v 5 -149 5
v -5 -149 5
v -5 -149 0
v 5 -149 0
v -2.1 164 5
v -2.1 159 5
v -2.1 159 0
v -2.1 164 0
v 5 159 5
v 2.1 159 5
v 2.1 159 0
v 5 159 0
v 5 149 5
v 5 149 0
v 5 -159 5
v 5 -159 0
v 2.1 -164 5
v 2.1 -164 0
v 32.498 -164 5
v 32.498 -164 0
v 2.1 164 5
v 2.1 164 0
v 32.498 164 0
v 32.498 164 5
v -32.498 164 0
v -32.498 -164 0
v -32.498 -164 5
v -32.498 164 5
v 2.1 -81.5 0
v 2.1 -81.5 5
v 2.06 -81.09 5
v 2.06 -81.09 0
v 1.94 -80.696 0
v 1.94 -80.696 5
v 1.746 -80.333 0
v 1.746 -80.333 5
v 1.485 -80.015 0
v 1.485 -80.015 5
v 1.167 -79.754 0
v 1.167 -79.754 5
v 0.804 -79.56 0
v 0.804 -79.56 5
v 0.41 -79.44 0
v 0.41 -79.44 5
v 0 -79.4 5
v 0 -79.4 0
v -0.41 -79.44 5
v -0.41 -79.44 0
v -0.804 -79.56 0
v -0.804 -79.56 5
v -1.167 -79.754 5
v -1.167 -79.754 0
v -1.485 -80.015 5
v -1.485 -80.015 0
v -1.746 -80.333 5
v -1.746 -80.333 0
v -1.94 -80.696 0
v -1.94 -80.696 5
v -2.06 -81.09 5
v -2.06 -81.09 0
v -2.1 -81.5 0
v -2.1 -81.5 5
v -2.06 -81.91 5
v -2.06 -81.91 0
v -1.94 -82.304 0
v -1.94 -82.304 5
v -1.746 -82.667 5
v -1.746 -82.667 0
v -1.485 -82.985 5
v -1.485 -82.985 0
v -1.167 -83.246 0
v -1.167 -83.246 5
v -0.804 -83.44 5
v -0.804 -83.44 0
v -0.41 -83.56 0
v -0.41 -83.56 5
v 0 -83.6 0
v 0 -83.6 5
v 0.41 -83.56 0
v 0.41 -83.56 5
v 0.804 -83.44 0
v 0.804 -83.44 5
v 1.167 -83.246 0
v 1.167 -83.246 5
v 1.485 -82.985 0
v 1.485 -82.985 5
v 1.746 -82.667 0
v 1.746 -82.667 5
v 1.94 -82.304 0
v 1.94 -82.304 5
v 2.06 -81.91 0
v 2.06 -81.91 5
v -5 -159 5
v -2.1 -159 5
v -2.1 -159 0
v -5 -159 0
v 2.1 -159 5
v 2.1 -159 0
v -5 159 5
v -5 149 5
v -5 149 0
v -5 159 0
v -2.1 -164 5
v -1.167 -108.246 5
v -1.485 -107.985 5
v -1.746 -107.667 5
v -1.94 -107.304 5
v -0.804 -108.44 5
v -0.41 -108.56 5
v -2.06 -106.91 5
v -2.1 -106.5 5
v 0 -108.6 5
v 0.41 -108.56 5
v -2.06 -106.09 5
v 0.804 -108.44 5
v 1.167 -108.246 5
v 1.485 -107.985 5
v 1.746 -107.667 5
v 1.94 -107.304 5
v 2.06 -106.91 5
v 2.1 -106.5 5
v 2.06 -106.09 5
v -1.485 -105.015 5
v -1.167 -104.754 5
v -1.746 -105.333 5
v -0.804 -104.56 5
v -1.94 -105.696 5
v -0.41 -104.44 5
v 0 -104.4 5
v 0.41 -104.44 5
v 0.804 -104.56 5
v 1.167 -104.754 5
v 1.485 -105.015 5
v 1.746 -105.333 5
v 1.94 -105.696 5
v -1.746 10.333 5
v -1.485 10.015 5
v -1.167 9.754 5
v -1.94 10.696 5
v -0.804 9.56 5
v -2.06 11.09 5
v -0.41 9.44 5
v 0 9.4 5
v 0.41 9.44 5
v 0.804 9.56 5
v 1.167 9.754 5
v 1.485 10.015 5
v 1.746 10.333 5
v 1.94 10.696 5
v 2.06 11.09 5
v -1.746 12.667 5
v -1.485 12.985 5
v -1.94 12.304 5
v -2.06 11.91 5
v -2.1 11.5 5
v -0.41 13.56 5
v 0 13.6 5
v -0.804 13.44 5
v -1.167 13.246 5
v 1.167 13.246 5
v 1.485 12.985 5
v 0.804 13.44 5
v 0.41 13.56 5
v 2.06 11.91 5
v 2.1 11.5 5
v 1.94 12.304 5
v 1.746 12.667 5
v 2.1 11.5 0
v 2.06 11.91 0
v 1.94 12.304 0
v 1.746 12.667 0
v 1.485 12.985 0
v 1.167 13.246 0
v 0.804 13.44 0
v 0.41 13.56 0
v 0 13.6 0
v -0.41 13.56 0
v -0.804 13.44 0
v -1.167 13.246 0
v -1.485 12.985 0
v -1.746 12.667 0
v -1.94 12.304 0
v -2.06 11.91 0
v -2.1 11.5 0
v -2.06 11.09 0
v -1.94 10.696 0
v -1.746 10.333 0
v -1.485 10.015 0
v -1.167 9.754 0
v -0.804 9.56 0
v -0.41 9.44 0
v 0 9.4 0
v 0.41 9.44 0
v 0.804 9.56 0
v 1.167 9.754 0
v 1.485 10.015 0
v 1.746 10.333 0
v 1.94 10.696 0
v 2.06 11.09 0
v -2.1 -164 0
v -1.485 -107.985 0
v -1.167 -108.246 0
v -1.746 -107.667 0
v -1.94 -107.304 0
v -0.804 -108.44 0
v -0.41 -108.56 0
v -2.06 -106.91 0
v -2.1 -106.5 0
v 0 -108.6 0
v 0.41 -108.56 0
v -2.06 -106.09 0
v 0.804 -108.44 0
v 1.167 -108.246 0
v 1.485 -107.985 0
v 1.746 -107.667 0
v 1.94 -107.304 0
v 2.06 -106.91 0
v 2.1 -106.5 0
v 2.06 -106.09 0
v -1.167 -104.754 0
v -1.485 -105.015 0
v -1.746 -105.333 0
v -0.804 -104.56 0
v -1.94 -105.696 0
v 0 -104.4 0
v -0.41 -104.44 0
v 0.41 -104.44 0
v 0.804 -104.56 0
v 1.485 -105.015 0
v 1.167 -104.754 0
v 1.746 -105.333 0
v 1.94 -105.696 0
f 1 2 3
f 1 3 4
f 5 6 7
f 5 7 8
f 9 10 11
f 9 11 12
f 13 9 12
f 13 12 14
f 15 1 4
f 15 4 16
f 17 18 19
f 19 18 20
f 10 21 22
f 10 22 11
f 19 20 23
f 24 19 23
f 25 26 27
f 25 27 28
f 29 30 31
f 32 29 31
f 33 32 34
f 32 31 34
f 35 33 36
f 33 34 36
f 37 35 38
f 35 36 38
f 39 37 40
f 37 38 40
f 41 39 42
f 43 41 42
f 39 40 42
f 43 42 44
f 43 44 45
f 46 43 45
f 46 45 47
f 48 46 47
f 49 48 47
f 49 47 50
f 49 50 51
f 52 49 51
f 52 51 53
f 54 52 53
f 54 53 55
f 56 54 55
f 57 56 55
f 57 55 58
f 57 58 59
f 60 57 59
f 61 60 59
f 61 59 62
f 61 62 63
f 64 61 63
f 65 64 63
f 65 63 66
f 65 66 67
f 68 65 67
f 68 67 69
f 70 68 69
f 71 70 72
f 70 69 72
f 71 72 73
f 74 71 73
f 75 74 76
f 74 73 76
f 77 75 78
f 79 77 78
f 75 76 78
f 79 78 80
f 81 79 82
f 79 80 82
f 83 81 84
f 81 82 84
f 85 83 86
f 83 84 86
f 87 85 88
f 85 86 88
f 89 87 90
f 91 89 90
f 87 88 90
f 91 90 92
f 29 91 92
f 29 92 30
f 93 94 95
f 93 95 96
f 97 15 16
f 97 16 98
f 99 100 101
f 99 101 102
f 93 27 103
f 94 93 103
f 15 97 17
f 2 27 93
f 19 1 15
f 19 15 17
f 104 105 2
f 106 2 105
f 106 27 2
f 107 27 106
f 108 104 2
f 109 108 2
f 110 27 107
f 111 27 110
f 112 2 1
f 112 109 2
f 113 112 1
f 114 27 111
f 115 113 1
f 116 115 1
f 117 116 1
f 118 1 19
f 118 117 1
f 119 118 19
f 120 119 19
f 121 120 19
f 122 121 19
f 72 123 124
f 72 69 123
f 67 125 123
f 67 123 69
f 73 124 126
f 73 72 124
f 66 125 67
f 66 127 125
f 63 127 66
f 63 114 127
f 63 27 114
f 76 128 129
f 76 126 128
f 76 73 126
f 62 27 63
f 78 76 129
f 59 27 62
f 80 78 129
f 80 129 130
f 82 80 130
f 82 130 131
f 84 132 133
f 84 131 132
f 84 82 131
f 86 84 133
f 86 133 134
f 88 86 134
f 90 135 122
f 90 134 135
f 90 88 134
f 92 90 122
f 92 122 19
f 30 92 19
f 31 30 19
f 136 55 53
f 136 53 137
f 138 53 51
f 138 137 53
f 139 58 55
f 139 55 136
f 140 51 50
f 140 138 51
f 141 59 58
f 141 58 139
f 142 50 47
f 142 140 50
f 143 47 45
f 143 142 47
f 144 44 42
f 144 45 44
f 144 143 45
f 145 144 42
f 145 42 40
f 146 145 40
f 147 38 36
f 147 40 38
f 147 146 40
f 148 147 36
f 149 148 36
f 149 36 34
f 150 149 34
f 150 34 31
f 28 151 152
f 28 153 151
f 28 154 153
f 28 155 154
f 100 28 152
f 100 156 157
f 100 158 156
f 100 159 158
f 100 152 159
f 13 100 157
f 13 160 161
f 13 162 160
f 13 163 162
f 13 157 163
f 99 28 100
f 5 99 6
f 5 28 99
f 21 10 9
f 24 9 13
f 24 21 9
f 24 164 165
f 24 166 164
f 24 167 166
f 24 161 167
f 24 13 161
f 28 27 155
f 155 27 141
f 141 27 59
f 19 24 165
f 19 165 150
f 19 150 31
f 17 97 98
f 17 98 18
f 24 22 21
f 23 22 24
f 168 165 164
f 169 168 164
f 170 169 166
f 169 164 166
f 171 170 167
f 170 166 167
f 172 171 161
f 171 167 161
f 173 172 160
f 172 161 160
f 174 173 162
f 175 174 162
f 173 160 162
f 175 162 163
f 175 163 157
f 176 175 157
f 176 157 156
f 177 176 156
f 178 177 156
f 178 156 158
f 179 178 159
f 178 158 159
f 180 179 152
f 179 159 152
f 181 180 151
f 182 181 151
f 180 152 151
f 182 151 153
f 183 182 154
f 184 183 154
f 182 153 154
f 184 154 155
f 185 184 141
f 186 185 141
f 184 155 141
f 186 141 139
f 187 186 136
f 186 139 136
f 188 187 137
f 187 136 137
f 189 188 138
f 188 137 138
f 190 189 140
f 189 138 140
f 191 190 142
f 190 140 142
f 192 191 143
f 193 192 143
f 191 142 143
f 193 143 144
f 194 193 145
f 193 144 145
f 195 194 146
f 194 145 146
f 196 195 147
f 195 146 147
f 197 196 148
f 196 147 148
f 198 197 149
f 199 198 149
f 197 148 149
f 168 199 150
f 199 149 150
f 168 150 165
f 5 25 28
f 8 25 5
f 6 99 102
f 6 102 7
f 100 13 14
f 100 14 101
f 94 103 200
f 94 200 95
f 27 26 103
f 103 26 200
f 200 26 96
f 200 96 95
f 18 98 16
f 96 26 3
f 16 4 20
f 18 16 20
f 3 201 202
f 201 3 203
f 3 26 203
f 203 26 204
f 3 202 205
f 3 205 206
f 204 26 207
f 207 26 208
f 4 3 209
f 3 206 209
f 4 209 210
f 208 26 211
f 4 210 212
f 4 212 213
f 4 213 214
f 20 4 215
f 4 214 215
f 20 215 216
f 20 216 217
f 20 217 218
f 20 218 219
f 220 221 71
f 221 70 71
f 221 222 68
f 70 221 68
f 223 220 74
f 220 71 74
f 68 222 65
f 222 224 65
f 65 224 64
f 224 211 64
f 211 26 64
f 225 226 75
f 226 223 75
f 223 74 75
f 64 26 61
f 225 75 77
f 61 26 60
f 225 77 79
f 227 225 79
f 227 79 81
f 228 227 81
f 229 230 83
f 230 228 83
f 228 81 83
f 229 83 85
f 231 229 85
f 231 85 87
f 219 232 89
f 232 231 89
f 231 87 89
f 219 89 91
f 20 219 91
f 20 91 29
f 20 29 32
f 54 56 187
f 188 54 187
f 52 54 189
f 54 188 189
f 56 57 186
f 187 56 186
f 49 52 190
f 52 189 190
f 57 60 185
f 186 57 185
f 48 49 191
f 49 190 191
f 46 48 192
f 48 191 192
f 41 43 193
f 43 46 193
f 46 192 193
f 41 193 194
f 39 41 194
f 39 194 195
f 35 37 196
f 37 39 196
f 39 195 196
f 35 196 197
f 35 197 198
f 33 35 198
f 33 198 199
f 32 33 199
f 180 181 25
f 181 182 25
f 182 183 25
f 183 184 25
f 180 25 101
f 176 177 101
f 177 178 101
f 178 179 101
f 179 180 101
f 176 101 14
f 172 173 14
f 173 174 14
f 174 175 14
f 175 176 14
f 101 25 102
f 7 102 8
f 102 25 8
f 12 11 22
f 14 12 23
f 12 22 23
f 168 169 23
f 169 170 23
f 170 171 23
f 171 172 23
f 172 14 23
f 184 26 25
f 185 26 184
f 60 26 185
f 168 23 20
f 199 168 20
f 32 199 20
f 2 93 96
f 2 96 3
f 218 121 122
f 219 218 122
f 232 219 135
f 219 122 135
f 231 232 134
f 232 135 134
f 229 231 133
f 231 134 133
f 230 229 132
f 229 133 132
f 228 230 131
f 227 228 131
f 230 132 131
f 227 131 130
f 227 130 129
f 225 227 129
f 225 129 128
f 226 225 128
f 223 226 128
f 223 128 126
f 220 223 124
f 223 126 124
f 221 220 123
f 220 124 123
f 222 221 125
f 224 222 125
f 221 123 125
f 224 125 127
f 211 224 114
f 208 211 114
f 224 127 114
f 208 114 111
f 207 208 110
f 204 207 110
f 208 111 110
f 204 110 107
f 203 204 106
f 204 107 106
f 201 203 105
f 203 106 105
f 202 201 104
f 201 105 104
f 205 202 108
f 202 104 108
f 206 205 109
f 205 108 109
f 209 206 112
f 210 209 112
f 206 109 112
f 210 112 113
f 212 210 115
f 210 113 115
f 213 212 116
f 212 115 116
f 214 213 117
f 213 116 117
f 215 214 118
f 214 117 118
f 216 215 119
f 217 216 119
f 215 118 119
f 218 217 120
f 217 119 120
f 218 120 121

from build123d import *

# Parameters (mm, degrees)
SKETCH1_W           = 64.996
SKETCH1_H           = 328
BOSS_EXTRUDE1_DEPTH = 5
SKETCH2_R           = 2.1
CUT_EXTRUDE1_DEPTH  = 10
CUT_EXTRUDE2_DEPTH  = 10
SKETCH4_R           = 2.1
CUT_EXTRUDE3_DEPTH  = 5
SKETCH5_R           = 2.1
CUT_EXTRUDE4_DEPTH  = 5


with BuildPart() as part:
    # Sketch1 → Boss-Extrude1 (new body)
    with BuildSketch(Plane.XY):
        Rectangle(SKETCH1_W, SKETCH1_H)
    extrude(amount=BOSS_EXTRUDE1_DEPTH)

    # Sketch2 → Cut-Extrude1 (cut)
    with BuildSketch(Plane.XY.offset(5)):
        with Locations((0, -81.5)):
            Circle(SKETCH2_R)
    extrude(amount=-CUT_EXTRUDE1_DEPTH, mode=Mode.SUBTRACT)

    # Sketch3 → Cut-Extrude2 (cut)
    with BuildSketch(Plane.XY.offset(5)):
        Polygon((-2.1, 164), (2.1, 164), (2.1, 159), (5, 159), (5, 149), (-5, 149), (-5, 159), (-2.1, 159), align=None)
        Polygon((-2.1, -164), (-2.1, -159), (-5, -159), (-5, -149), (5, -149), (5, -159), (2.1, -159), (2.1, -164), align=None)
    extrude(amount=-CUT_EXTRUDE2_DEPTH, mode=Mode.SUBTRACT)

    # Sketch4 → Cut-Extrude3 (cut)
    with BuildSketch(Plane.XY.offset(5)):
        with Locations((0, -106.5)):
            Circle(SKETCH4_R)
    extrude(amount=-CUT_EXTRUDE3_DEPTH, mode=Mode.SUBTRACT)

    # Sketch5 → Cut-Extrude4 (cut)
    with BuildSketch(Plane.XY.offset(5)):
        with Locations((0, 11.5)):
            Circle(SKETCH5_R)
    extrude(amount=-CUT_EXTRUDE4_DEPTH, mode=Mode.SUBTRACT)


solid = part.part
